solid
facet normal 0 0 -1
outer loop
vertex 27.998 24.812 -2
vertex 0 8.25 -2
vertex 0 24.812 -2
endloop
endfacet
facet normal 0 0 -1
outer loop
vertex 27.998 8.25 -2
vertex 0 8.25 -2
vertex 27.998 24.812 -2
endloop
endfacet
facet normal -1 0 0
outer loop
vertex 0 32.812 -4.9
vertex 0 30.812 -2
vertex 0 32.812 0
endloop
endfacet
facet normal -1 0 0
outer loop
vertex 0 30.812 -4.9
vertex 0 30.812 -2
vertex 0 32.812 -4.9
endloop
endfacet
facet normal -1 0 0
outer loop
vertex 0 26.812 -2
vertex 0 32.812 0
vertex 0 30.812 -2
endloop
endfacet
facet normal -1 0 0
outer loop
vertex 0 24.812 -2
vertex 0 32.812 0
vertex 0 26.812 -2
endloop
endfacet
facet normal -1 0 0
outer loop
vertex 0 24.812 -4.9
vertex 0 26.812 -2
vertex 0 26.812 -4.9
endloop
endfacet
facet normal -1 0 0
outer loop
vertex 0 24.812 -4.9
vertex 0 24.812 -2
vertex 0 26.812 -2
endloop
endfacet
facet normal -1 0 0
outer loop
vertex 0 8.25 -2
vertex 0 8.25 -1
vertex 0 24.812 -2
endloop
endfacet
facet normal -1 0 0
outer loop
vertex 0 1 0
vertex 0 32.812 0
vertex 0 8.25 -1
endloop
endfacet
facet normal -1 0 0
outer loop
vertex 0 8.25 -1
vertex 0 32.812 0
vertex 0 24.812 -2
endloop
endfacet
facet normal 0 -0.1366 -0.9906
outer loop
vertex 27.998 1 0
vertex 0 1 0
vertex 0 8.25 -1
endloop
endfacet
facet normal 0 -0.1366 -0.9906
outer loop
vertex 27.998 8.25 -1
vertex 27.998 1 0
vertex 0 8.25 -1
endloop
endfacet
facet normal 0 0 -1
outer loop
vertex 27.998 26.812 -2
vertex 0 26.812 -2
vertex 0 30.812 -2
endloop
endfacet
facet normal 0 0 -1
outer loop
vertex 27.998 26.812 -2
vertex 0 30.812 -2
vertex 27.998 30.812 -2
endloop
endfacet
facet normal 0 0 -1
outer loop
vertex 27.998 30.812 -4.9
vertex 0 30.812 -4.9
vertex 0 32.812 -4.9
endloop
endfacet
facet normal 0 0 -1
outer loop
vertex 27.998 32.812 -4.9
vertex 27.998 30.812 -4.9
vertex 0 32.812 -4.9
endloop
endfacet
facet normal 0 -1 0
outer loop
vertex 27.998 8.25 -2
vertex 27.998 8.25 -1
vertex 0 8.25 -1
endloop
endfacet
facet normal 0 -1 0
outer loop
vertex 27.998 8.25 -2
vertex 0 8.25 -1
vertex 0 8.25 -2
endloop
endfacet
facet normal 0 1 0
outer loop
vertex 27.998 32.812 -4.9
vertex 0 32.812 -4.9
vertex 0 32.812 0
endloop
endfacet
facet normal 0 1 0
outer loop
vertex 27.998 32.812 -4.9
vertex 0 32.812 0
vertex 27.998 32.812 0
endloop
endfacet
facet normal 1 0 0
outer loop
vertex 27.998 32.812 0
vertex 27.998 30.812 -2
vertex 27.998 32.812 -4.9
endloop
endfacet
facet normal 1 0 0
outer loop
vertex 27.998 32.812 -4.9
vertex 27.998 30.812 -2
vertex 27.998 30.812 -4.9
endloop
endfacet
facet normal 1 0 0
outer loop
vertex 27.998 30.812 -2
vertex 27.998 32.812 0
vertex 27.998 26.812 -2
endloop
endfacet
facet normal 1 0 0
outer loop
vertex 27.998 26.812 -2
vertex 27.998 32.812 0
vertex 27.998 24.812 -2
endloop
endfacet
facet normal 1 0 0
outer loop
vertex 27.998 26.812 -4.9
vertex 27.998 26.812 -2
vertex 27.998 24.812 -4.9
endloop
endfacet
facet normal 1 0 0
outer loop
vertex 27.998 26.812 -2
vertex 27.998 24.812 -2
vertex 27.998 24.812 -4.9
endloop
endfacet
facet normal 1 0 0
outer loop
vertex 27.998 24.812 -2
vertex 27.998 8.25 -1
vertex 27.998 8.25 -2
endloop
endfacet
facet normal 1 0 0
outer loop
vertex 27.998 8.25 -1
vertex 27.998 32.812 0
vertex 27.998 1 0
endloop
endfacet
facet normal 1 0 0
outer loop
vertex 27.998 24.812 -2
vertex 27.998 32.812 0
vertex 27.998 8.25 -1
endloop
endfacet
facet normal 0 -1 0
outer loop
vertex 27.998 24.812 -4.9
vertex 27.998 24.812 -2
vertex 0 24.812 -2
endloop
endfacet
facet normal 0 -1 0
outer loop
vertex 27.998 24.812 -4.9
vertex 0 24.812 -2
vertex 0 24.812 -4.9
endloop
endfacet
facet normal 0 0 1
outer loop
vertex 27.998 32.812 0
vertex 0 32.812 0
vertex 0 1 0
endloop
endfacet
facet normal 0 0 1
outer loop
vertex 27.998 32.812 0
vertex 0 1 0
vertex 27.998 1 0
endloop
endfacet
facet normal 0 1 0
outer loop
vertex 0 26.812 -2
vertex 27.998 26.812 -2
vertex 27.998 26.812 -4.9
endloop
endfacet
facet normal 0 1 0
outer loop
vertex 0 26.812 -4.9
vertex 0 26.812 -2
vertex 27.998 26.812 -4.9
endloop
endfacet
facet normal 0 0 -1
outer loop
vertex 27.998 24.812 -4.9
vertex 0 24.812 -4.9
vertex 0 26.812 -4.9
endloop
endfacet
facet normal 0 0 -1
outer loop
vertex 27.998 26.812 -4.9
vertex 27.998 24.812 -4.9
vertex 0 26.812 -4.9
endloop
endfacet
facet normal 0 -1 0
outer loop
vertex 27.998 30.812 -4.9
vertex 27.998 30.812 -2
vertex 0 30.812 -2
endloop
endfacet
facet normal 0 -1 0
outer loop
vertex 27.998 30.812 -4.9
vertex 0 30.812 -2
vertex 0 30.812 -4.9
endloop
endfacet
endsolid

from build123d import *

# Parameters (mm, degrees)
SKETCH1_W           = 27.99800038
SKETCH1_H           = 2
BOSS_EXTRUDE1_DEPTH = 10
CUT_EXTRUDE1_DEPTH  = 32
SKETCH4_W           = 27.99800038
SKETCH4_H           = 2
BOSS_EXTRUDE2_DEPTH = 22.81231465
SKETCH5_W           = 4.9
SKETCH5_H           = 2
BOSS_EXTRUDE3_DEPTH = 27.99800038


with BuildPart() as part:
    # Sketch1 → Boss-Extrude1 (new body)
    with BuildSketch(Plane(origin=(0, 0, 0), x_dir=(1, 0, 0), z_dir=(0, 1, 0))):
        with Locations((13.99900019, 1)):
            Rectangle(SKETCH1_W, SKETCH1_H)
    extrude(amount=BOSS_EXTRUDE1_DEPTH)

    # Sketch3 → Cut-Extrude1 (cut)
    with BuildSketch(Plane(origin=(27.99800038, 0, 0), x_dir=(0, 0, -1), z_dir=(1, 0, 0))):
        Polygon((1, 8.25), (2, 8.25), (2, 0), (0, 0), (0, 1), align=None)
    extrude(amount=-CUT_EXTRUDE1_DEPTH, mode=Mode.SUBTRACT)

    # Sketch4 → Boss-Extrude2 (add)
    with BuildSketch(Plane(origin=(0, 10, 0), x_dir=(1, 0, 0), z_dir=(0, 1, 0))):
        with Locations((13.99900019, 1)):
            Rectangle(SKETCH4_W, SKETCH4_H)
    extrude(amount=BOSS_EXTRUDE2_DEPTH)

    # Sketch5 → Boss-Extrude3 (add)
    with BuildSketch(Plane(origin=(27.99800038, 0, 0), x_dir=(0, 0, -1), z_dir=(1, 0, 0))):
        with Locations((2.45, 31.81231465)):
            Rectangle(SKETCH5_W, SKETCH5_H)
        with Locations((2.45, 25.81231465)):
            Rectangle(SKETCH5_W, SKETCH5_H)
    extrude(amount=-BOSS_EXTRUDE3_DEPTH)


solid = part.part
